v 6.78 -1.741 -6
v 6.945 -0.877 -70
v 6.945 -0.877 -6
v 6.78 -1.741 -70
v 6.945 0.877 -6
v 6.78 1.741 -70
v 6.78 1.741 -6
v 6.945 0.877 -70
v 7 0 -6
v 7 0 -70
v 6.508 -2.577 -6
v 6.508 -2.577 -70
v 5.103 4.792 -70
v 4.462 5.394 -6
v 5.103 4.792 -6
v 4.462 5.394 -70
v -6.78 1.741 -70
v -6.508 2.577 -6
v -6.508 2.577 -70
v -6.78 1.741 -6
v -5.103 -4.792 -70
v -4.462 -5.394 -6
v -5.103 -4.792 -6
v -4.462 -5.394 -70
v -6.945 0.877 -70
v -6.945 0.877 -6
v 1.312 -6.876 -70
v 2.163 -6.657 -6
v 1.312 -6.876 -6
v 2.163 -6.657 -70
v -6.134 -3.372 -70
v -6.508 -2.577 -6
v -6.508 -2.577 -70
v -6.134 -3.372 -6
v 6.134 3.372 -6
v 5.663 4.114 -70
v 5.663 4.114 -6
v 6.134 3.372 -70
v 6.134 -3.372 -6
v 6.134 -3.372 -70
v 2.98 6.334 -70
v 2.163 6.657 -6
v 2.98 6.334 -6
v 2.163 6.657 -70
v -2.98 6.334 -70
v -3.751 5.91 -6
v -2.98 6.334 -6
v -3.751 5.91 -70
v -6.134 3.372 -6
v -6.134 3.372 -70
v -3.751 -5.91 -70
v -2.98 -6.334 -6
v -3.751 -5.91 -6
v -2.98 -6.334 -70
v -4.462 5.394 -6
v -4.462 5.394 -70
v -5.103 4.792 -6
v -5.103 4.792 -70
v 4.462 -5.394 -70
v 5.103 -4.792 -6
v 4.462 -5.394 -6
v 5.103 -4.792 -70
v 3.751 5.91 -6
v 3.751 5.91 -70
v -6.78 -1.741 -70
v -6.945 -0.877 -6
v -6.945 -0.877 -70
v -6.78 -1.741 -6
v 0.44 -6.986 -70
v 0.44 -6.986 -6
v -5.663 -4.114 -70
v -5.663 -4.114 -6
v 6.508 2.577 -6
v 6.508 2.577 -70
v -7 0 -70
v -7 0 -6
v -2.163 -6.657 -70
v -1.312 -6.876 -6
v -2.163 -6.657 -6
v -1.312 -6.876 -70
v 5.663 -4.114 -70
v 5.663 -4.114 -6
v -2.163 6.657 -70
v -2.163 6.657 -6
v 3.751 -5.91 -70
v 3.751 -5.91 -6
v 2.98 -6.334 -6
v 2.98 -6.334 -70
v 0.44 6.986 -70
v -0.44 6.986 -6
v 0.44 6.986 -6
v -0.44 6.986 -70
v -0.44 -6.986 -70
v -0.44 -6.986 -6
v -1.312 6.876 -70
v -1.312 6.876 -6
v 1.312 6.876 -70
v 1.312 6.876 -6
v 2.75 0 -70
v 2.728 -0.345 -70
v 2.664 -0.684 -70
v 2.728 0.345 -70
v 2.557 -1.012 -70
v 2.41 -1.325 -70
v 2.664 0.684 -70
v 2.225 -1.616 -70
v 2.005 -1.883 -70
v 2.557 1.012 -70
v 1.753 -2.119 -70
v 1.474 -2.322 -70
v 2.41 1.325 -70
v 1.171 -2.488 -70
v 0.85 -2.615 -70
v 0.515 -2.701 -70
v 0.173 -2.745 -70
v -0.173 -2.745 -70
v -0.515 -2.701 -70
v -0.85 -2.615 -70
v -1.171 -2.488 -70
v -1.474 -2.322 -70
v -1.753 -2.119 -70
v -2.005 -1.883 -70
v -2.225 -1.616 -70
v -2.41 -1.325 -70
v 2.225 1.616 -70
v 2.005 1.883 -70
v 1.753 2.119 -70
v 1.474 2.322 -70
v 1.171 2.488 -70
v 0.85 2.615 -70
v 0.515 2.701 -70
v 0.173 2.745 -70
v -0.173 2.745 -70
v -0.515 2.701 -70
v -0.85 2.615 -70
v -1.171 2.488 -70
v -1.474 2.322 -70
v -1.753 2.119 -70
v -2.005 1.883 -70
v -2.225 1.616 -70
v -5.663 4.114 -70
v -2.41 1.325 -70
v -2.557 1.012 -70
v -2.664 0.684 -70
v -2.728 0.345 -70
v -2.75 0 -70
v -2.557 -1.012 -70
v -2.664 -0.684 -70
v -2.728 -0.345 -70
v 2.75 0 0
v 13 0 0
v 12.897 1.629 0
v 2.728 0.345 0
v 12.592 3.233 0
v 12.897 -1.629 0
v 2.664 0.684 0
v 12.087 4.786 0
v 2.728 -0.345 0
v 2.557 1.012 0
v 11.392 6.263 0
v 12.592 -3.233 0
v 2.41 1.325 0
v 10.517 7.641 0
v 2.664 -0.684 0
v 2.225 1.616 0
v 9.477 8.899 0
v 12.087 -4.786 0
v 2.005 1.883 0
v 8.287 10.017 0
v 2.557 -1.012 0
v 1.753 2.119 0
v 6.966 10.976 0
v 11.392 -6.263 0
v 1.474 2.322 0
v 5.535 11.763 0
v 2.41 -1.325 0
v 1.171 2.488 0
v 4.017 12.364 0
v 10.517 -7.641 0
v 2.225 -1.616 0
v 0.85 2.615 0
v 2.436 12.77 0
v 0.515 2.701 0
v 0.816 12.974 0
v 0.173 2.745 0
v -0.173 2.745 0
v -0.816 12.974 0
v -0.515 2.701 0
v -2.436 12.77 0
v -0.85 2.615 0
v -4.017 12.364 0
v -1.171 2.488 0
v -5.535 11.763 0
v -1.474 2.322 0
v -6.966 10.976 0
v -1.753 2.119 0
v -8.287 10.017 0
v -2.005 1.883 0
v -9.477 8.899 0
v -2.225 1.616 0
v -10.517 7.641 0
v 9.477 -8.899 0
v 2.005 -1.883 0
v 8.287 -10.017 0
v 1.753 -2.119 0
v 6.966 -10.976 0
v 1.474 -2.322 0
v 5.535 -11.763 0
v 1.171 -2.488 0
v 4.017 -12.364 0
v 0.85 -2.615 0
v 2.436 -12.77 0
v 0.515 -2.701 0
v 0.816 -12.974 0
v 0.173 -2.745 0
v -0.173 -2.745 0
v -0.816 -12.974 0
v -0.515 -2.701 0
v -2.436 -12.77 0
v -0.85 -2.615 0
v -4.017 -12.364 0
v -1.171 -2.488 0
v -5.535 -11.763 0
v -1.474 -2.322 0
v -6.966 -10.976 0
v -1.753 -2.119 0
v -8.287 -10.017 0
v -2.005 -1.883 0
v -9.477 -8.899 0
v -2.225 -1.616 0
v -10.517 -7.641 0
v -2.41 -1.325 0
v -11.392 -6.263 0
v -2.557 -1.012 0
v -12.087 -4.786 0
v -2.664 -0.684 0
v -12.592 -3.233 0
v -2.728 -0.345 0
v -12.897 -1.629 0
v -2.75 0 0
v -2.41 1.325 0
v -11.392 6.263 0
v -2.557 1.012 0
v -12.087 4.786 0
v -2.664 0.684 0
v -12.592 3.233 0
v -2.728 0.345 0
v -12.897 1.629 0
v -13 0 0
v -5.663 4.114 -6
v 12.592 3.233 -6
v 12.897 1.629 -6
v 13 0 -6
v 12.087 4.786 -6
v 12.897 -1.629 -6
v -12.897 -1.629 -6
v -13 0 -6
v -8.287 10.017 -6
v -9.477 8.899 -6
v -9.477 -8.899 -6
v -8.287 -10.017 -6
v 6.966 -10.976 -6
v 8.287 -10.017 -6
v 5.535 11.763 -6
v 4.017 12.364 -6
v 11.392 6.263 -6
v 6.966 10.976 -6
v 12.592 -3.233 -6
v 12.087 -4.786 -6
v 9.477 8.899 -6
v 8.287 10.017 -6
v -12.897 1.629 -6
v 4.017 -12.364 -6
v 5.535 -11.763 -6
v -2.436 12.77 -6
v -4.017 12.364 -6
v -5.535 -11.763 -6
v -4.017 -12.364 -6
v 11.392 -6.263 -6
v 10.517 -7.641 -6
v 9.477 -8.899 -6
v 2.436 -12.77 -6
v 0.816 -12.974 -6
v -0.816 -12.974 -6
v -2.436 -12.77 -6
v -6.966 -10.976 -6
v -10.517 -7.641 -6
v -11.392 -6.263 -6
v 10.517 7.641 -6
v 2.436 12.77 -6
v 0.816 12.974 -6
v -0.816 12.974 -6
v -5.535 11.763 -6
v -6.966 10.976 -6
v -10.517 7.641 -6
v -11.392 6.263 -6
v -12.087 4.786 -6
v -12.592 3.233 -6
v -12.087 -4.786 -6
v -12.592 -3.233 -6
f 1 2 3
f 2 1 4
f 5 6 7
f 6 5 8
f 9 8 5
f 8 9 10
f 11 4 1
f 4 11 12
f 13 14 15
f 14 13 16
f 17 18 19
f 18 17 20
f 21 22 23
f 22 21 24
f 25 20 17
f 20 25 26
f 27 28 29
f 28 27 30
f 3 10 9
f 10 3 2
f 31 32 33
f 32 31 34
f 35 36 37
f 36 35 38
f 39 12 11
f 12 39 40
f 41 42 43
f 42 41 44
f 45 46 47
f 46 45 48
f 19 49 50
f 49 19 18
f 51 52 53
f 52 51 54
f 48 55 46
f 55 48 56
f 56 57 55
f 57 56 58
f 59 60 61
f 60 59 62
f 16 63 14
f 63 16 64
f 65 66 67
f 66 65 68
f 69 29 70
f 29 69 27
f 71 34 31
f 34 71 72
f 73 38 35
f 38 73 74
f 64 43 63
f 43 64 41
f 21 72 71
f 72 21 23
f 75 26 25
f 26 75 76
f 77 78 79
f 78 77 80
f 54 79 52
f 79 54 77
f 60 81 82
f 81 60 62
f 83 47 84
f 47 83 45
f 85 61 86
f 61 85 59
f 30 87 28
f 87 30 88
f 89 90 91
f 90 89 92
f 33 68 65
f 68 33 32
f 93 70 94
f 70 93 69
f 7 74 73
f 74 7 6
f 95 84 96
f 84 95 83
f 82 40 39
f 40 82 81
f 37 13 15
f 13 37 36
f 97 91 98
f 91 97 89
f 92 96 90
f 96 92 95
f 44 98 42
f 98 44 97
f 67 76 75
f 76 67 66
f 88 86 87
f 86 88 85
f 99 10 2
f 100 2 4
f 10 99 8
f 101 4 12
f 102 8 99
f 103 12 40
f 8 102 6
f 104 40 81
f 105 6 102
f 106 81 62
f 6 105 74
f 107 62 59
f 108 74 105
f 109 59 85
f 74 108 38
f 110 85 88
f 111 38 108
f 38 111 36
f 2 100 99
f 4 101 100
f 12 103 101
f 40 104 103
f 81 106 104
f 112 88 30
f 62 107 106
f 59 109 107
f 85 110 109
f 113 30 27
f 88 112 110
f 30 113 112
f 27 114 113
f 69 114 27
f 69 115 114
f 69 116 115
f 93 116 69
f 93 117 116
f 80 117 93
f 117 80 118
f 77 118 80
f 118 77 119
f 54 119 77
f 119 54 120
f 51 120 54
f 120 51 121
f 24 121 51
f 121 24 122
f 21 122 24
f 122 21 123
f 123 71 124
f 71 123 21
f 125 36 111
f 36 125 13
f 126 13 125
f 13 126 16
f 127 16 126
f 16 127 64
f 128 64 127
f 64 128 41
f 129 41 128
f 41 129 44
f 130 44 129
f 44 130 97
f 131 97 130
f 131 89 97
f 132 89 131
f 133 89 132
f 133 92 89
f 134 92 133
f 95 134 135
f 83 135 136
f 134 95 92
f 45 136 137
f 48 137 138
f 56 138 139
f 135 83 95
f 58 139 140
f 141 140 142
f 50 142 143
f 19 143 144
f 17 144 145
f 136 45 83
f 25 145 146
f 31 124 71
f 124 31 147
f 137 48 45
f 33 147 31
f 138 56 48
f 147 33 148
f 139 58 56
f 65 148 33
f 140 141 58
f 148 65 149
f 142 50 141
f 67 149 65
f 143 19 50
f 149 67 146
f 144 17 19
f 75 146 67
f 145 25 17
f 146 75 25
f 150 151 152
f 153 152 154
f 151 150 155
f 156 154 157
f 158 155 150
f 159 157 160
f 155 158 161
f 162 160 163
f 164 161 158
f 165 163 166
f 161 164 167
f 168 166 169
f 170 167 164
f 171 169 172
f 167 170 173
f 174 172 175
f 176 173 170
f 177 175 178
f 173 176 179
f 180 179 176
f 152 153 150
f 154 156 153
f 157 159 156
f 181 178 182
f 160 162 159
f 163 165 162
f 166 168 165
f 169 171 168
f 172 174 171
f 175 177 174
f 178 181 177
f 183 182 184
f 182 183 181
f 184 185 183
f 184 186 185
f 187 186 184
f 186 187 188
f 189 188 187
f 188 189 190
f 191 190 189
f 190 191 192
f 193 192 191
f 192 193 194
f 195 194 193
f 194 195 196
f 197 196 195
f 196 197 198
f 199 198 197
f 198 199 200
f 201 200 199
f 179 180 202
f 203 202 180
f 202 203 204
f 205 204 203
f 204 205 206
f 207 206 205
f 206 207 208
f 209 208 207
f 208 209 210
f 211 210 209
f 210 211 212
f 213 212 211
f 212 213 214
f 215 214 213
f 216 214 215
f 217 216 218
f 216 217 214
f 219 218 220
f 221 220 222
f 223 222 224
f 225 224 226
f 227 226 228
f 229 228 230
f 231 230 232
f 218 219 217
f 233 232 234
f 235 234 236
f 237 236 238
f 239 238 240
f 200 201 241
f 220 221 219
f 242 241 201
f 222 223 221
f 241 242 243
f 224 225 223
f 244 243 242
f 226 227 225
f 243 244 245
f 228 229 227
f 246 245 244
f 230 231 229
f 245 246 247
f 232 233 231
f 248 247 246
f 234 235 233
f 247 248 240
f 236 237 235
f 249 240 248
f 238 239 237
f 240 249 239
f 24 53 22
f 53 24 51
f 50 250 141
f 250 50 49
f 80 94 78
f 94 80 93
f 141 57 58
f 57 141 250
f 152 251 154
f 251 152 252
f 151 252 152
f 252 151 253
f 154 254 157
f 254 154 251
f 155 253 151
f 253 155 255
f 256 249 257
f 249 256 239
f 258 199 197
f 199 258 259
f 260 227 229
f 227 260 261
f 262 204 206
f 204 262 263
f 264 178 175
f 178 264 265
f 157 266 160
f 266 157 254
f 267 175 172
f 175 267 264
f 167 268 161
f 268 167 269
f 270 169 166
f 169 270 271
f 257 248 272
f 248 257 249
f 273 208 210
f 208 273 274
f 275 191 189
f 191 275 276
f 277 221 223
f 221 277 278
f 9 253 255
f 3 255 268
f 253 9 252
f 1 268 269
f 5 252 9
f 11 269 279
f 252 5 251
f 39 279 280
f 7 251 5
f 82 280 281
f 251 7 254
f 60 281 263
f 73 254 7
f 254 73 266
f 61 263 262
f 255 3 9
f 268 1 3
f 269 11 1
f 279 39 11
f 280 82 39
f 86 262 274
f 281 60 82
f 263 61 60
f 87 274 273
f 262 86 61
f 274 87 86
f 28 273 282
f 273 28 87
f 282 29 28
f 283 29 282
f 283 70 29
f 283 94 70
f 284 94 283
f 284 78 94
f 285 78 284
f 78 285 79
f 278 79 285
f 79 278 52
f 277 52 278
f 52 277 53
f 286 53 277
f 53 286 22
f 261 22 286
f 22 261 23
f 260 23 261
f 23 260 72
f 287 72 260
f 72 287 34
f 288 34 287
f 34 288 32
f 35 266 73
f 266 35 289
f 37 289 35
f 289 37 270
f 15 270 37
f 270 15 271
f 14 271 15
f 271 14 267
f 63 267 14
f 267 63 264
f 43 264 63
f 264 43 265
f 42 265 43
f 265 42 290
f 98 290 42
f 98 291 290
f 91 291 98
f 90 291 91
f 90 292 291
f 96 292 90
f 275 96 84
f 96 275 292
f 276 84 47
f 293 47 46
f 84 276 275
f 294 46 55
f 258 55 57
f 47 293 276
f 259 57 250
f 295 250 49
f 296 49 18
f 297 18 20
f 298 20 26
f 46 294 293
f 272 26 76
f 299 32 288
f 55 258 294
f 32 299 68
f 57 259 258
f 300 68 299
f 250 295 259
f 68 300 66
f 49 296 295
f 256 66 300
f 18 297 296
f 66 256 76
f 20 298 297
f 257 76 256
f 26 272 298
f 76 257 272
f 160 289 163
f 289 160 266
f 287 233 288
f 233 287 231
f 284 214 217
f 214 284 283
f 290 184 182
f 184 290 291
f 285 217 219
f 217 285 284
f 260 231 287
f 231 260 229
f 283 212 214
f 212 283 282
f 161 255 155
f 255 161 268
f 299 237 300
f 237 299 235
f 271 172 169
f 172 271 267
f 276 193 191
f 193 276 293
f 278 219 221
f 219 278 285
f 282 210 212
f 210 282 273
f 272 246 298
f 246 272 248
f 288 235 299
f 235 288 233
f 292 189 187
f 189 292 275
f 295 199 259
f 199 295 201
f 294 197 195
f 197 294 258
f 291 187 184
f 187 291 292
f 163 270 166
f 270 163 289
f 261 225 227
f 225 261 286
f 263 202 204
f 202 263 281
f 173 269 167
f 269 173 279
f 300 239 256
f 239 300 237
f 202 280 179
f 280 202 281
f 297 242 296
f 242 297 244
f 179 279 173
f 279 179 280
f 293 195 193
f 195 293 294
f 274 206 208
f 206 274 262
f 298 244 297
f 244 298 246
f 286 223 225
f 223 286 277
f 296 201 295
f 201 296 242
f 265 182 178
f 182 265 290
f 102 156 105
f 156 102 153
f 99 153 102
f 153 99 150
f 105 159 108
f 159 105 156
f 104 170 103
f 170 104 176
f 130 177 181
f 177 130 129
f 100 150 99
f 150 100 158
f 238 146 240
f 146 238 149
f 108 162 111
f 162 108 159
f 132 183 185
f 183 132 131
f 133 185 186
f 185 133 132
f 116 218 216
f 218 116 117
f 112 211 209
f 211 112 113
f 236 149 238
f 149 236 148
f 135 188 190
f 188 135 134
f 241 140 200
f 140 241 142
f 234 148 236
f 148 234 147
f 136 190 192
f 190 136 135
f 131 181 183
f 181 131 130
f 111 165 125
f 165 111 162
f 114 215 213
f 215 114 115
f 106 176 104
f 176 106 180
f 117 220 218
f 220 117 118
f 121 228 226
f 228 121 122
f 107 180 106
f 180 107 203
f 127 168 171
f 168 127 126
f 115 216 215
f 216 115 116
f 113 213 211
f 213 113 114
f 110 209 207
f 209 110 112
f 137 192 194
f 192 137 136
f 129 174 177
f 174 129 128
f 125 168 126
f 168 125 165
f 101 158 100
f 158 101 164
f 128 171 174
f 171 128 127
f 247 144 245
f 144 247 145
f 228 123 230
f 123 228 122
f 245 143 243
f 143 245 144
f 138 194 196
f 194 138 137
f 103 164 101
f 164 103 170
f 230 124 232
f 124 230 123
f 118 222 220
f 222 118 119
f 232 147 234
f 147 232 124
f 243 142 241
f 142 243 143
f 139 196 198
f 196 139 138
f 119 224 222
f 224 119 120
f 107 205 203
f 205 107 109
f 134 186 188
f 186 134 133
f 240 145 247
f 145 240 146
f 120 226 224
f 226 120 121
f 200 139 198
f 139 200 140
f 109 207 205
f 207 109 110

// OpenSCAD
$fn = 50;


difference() {
	union() {
		translate(v = [0, 0, -70.0000000000]) {
			cylinder(h = 70, r = 7.0000000000);
		}
		translate(v = [0, 0, -6.0000000000]) {
			cylinder(h = 6, r = 13.0000000000);
		}
	}
	union() {
		#translate(v = [0, 0, -70]) {
			cylinder(h = 70, r = 2.7500000000);
		}
	}
}
